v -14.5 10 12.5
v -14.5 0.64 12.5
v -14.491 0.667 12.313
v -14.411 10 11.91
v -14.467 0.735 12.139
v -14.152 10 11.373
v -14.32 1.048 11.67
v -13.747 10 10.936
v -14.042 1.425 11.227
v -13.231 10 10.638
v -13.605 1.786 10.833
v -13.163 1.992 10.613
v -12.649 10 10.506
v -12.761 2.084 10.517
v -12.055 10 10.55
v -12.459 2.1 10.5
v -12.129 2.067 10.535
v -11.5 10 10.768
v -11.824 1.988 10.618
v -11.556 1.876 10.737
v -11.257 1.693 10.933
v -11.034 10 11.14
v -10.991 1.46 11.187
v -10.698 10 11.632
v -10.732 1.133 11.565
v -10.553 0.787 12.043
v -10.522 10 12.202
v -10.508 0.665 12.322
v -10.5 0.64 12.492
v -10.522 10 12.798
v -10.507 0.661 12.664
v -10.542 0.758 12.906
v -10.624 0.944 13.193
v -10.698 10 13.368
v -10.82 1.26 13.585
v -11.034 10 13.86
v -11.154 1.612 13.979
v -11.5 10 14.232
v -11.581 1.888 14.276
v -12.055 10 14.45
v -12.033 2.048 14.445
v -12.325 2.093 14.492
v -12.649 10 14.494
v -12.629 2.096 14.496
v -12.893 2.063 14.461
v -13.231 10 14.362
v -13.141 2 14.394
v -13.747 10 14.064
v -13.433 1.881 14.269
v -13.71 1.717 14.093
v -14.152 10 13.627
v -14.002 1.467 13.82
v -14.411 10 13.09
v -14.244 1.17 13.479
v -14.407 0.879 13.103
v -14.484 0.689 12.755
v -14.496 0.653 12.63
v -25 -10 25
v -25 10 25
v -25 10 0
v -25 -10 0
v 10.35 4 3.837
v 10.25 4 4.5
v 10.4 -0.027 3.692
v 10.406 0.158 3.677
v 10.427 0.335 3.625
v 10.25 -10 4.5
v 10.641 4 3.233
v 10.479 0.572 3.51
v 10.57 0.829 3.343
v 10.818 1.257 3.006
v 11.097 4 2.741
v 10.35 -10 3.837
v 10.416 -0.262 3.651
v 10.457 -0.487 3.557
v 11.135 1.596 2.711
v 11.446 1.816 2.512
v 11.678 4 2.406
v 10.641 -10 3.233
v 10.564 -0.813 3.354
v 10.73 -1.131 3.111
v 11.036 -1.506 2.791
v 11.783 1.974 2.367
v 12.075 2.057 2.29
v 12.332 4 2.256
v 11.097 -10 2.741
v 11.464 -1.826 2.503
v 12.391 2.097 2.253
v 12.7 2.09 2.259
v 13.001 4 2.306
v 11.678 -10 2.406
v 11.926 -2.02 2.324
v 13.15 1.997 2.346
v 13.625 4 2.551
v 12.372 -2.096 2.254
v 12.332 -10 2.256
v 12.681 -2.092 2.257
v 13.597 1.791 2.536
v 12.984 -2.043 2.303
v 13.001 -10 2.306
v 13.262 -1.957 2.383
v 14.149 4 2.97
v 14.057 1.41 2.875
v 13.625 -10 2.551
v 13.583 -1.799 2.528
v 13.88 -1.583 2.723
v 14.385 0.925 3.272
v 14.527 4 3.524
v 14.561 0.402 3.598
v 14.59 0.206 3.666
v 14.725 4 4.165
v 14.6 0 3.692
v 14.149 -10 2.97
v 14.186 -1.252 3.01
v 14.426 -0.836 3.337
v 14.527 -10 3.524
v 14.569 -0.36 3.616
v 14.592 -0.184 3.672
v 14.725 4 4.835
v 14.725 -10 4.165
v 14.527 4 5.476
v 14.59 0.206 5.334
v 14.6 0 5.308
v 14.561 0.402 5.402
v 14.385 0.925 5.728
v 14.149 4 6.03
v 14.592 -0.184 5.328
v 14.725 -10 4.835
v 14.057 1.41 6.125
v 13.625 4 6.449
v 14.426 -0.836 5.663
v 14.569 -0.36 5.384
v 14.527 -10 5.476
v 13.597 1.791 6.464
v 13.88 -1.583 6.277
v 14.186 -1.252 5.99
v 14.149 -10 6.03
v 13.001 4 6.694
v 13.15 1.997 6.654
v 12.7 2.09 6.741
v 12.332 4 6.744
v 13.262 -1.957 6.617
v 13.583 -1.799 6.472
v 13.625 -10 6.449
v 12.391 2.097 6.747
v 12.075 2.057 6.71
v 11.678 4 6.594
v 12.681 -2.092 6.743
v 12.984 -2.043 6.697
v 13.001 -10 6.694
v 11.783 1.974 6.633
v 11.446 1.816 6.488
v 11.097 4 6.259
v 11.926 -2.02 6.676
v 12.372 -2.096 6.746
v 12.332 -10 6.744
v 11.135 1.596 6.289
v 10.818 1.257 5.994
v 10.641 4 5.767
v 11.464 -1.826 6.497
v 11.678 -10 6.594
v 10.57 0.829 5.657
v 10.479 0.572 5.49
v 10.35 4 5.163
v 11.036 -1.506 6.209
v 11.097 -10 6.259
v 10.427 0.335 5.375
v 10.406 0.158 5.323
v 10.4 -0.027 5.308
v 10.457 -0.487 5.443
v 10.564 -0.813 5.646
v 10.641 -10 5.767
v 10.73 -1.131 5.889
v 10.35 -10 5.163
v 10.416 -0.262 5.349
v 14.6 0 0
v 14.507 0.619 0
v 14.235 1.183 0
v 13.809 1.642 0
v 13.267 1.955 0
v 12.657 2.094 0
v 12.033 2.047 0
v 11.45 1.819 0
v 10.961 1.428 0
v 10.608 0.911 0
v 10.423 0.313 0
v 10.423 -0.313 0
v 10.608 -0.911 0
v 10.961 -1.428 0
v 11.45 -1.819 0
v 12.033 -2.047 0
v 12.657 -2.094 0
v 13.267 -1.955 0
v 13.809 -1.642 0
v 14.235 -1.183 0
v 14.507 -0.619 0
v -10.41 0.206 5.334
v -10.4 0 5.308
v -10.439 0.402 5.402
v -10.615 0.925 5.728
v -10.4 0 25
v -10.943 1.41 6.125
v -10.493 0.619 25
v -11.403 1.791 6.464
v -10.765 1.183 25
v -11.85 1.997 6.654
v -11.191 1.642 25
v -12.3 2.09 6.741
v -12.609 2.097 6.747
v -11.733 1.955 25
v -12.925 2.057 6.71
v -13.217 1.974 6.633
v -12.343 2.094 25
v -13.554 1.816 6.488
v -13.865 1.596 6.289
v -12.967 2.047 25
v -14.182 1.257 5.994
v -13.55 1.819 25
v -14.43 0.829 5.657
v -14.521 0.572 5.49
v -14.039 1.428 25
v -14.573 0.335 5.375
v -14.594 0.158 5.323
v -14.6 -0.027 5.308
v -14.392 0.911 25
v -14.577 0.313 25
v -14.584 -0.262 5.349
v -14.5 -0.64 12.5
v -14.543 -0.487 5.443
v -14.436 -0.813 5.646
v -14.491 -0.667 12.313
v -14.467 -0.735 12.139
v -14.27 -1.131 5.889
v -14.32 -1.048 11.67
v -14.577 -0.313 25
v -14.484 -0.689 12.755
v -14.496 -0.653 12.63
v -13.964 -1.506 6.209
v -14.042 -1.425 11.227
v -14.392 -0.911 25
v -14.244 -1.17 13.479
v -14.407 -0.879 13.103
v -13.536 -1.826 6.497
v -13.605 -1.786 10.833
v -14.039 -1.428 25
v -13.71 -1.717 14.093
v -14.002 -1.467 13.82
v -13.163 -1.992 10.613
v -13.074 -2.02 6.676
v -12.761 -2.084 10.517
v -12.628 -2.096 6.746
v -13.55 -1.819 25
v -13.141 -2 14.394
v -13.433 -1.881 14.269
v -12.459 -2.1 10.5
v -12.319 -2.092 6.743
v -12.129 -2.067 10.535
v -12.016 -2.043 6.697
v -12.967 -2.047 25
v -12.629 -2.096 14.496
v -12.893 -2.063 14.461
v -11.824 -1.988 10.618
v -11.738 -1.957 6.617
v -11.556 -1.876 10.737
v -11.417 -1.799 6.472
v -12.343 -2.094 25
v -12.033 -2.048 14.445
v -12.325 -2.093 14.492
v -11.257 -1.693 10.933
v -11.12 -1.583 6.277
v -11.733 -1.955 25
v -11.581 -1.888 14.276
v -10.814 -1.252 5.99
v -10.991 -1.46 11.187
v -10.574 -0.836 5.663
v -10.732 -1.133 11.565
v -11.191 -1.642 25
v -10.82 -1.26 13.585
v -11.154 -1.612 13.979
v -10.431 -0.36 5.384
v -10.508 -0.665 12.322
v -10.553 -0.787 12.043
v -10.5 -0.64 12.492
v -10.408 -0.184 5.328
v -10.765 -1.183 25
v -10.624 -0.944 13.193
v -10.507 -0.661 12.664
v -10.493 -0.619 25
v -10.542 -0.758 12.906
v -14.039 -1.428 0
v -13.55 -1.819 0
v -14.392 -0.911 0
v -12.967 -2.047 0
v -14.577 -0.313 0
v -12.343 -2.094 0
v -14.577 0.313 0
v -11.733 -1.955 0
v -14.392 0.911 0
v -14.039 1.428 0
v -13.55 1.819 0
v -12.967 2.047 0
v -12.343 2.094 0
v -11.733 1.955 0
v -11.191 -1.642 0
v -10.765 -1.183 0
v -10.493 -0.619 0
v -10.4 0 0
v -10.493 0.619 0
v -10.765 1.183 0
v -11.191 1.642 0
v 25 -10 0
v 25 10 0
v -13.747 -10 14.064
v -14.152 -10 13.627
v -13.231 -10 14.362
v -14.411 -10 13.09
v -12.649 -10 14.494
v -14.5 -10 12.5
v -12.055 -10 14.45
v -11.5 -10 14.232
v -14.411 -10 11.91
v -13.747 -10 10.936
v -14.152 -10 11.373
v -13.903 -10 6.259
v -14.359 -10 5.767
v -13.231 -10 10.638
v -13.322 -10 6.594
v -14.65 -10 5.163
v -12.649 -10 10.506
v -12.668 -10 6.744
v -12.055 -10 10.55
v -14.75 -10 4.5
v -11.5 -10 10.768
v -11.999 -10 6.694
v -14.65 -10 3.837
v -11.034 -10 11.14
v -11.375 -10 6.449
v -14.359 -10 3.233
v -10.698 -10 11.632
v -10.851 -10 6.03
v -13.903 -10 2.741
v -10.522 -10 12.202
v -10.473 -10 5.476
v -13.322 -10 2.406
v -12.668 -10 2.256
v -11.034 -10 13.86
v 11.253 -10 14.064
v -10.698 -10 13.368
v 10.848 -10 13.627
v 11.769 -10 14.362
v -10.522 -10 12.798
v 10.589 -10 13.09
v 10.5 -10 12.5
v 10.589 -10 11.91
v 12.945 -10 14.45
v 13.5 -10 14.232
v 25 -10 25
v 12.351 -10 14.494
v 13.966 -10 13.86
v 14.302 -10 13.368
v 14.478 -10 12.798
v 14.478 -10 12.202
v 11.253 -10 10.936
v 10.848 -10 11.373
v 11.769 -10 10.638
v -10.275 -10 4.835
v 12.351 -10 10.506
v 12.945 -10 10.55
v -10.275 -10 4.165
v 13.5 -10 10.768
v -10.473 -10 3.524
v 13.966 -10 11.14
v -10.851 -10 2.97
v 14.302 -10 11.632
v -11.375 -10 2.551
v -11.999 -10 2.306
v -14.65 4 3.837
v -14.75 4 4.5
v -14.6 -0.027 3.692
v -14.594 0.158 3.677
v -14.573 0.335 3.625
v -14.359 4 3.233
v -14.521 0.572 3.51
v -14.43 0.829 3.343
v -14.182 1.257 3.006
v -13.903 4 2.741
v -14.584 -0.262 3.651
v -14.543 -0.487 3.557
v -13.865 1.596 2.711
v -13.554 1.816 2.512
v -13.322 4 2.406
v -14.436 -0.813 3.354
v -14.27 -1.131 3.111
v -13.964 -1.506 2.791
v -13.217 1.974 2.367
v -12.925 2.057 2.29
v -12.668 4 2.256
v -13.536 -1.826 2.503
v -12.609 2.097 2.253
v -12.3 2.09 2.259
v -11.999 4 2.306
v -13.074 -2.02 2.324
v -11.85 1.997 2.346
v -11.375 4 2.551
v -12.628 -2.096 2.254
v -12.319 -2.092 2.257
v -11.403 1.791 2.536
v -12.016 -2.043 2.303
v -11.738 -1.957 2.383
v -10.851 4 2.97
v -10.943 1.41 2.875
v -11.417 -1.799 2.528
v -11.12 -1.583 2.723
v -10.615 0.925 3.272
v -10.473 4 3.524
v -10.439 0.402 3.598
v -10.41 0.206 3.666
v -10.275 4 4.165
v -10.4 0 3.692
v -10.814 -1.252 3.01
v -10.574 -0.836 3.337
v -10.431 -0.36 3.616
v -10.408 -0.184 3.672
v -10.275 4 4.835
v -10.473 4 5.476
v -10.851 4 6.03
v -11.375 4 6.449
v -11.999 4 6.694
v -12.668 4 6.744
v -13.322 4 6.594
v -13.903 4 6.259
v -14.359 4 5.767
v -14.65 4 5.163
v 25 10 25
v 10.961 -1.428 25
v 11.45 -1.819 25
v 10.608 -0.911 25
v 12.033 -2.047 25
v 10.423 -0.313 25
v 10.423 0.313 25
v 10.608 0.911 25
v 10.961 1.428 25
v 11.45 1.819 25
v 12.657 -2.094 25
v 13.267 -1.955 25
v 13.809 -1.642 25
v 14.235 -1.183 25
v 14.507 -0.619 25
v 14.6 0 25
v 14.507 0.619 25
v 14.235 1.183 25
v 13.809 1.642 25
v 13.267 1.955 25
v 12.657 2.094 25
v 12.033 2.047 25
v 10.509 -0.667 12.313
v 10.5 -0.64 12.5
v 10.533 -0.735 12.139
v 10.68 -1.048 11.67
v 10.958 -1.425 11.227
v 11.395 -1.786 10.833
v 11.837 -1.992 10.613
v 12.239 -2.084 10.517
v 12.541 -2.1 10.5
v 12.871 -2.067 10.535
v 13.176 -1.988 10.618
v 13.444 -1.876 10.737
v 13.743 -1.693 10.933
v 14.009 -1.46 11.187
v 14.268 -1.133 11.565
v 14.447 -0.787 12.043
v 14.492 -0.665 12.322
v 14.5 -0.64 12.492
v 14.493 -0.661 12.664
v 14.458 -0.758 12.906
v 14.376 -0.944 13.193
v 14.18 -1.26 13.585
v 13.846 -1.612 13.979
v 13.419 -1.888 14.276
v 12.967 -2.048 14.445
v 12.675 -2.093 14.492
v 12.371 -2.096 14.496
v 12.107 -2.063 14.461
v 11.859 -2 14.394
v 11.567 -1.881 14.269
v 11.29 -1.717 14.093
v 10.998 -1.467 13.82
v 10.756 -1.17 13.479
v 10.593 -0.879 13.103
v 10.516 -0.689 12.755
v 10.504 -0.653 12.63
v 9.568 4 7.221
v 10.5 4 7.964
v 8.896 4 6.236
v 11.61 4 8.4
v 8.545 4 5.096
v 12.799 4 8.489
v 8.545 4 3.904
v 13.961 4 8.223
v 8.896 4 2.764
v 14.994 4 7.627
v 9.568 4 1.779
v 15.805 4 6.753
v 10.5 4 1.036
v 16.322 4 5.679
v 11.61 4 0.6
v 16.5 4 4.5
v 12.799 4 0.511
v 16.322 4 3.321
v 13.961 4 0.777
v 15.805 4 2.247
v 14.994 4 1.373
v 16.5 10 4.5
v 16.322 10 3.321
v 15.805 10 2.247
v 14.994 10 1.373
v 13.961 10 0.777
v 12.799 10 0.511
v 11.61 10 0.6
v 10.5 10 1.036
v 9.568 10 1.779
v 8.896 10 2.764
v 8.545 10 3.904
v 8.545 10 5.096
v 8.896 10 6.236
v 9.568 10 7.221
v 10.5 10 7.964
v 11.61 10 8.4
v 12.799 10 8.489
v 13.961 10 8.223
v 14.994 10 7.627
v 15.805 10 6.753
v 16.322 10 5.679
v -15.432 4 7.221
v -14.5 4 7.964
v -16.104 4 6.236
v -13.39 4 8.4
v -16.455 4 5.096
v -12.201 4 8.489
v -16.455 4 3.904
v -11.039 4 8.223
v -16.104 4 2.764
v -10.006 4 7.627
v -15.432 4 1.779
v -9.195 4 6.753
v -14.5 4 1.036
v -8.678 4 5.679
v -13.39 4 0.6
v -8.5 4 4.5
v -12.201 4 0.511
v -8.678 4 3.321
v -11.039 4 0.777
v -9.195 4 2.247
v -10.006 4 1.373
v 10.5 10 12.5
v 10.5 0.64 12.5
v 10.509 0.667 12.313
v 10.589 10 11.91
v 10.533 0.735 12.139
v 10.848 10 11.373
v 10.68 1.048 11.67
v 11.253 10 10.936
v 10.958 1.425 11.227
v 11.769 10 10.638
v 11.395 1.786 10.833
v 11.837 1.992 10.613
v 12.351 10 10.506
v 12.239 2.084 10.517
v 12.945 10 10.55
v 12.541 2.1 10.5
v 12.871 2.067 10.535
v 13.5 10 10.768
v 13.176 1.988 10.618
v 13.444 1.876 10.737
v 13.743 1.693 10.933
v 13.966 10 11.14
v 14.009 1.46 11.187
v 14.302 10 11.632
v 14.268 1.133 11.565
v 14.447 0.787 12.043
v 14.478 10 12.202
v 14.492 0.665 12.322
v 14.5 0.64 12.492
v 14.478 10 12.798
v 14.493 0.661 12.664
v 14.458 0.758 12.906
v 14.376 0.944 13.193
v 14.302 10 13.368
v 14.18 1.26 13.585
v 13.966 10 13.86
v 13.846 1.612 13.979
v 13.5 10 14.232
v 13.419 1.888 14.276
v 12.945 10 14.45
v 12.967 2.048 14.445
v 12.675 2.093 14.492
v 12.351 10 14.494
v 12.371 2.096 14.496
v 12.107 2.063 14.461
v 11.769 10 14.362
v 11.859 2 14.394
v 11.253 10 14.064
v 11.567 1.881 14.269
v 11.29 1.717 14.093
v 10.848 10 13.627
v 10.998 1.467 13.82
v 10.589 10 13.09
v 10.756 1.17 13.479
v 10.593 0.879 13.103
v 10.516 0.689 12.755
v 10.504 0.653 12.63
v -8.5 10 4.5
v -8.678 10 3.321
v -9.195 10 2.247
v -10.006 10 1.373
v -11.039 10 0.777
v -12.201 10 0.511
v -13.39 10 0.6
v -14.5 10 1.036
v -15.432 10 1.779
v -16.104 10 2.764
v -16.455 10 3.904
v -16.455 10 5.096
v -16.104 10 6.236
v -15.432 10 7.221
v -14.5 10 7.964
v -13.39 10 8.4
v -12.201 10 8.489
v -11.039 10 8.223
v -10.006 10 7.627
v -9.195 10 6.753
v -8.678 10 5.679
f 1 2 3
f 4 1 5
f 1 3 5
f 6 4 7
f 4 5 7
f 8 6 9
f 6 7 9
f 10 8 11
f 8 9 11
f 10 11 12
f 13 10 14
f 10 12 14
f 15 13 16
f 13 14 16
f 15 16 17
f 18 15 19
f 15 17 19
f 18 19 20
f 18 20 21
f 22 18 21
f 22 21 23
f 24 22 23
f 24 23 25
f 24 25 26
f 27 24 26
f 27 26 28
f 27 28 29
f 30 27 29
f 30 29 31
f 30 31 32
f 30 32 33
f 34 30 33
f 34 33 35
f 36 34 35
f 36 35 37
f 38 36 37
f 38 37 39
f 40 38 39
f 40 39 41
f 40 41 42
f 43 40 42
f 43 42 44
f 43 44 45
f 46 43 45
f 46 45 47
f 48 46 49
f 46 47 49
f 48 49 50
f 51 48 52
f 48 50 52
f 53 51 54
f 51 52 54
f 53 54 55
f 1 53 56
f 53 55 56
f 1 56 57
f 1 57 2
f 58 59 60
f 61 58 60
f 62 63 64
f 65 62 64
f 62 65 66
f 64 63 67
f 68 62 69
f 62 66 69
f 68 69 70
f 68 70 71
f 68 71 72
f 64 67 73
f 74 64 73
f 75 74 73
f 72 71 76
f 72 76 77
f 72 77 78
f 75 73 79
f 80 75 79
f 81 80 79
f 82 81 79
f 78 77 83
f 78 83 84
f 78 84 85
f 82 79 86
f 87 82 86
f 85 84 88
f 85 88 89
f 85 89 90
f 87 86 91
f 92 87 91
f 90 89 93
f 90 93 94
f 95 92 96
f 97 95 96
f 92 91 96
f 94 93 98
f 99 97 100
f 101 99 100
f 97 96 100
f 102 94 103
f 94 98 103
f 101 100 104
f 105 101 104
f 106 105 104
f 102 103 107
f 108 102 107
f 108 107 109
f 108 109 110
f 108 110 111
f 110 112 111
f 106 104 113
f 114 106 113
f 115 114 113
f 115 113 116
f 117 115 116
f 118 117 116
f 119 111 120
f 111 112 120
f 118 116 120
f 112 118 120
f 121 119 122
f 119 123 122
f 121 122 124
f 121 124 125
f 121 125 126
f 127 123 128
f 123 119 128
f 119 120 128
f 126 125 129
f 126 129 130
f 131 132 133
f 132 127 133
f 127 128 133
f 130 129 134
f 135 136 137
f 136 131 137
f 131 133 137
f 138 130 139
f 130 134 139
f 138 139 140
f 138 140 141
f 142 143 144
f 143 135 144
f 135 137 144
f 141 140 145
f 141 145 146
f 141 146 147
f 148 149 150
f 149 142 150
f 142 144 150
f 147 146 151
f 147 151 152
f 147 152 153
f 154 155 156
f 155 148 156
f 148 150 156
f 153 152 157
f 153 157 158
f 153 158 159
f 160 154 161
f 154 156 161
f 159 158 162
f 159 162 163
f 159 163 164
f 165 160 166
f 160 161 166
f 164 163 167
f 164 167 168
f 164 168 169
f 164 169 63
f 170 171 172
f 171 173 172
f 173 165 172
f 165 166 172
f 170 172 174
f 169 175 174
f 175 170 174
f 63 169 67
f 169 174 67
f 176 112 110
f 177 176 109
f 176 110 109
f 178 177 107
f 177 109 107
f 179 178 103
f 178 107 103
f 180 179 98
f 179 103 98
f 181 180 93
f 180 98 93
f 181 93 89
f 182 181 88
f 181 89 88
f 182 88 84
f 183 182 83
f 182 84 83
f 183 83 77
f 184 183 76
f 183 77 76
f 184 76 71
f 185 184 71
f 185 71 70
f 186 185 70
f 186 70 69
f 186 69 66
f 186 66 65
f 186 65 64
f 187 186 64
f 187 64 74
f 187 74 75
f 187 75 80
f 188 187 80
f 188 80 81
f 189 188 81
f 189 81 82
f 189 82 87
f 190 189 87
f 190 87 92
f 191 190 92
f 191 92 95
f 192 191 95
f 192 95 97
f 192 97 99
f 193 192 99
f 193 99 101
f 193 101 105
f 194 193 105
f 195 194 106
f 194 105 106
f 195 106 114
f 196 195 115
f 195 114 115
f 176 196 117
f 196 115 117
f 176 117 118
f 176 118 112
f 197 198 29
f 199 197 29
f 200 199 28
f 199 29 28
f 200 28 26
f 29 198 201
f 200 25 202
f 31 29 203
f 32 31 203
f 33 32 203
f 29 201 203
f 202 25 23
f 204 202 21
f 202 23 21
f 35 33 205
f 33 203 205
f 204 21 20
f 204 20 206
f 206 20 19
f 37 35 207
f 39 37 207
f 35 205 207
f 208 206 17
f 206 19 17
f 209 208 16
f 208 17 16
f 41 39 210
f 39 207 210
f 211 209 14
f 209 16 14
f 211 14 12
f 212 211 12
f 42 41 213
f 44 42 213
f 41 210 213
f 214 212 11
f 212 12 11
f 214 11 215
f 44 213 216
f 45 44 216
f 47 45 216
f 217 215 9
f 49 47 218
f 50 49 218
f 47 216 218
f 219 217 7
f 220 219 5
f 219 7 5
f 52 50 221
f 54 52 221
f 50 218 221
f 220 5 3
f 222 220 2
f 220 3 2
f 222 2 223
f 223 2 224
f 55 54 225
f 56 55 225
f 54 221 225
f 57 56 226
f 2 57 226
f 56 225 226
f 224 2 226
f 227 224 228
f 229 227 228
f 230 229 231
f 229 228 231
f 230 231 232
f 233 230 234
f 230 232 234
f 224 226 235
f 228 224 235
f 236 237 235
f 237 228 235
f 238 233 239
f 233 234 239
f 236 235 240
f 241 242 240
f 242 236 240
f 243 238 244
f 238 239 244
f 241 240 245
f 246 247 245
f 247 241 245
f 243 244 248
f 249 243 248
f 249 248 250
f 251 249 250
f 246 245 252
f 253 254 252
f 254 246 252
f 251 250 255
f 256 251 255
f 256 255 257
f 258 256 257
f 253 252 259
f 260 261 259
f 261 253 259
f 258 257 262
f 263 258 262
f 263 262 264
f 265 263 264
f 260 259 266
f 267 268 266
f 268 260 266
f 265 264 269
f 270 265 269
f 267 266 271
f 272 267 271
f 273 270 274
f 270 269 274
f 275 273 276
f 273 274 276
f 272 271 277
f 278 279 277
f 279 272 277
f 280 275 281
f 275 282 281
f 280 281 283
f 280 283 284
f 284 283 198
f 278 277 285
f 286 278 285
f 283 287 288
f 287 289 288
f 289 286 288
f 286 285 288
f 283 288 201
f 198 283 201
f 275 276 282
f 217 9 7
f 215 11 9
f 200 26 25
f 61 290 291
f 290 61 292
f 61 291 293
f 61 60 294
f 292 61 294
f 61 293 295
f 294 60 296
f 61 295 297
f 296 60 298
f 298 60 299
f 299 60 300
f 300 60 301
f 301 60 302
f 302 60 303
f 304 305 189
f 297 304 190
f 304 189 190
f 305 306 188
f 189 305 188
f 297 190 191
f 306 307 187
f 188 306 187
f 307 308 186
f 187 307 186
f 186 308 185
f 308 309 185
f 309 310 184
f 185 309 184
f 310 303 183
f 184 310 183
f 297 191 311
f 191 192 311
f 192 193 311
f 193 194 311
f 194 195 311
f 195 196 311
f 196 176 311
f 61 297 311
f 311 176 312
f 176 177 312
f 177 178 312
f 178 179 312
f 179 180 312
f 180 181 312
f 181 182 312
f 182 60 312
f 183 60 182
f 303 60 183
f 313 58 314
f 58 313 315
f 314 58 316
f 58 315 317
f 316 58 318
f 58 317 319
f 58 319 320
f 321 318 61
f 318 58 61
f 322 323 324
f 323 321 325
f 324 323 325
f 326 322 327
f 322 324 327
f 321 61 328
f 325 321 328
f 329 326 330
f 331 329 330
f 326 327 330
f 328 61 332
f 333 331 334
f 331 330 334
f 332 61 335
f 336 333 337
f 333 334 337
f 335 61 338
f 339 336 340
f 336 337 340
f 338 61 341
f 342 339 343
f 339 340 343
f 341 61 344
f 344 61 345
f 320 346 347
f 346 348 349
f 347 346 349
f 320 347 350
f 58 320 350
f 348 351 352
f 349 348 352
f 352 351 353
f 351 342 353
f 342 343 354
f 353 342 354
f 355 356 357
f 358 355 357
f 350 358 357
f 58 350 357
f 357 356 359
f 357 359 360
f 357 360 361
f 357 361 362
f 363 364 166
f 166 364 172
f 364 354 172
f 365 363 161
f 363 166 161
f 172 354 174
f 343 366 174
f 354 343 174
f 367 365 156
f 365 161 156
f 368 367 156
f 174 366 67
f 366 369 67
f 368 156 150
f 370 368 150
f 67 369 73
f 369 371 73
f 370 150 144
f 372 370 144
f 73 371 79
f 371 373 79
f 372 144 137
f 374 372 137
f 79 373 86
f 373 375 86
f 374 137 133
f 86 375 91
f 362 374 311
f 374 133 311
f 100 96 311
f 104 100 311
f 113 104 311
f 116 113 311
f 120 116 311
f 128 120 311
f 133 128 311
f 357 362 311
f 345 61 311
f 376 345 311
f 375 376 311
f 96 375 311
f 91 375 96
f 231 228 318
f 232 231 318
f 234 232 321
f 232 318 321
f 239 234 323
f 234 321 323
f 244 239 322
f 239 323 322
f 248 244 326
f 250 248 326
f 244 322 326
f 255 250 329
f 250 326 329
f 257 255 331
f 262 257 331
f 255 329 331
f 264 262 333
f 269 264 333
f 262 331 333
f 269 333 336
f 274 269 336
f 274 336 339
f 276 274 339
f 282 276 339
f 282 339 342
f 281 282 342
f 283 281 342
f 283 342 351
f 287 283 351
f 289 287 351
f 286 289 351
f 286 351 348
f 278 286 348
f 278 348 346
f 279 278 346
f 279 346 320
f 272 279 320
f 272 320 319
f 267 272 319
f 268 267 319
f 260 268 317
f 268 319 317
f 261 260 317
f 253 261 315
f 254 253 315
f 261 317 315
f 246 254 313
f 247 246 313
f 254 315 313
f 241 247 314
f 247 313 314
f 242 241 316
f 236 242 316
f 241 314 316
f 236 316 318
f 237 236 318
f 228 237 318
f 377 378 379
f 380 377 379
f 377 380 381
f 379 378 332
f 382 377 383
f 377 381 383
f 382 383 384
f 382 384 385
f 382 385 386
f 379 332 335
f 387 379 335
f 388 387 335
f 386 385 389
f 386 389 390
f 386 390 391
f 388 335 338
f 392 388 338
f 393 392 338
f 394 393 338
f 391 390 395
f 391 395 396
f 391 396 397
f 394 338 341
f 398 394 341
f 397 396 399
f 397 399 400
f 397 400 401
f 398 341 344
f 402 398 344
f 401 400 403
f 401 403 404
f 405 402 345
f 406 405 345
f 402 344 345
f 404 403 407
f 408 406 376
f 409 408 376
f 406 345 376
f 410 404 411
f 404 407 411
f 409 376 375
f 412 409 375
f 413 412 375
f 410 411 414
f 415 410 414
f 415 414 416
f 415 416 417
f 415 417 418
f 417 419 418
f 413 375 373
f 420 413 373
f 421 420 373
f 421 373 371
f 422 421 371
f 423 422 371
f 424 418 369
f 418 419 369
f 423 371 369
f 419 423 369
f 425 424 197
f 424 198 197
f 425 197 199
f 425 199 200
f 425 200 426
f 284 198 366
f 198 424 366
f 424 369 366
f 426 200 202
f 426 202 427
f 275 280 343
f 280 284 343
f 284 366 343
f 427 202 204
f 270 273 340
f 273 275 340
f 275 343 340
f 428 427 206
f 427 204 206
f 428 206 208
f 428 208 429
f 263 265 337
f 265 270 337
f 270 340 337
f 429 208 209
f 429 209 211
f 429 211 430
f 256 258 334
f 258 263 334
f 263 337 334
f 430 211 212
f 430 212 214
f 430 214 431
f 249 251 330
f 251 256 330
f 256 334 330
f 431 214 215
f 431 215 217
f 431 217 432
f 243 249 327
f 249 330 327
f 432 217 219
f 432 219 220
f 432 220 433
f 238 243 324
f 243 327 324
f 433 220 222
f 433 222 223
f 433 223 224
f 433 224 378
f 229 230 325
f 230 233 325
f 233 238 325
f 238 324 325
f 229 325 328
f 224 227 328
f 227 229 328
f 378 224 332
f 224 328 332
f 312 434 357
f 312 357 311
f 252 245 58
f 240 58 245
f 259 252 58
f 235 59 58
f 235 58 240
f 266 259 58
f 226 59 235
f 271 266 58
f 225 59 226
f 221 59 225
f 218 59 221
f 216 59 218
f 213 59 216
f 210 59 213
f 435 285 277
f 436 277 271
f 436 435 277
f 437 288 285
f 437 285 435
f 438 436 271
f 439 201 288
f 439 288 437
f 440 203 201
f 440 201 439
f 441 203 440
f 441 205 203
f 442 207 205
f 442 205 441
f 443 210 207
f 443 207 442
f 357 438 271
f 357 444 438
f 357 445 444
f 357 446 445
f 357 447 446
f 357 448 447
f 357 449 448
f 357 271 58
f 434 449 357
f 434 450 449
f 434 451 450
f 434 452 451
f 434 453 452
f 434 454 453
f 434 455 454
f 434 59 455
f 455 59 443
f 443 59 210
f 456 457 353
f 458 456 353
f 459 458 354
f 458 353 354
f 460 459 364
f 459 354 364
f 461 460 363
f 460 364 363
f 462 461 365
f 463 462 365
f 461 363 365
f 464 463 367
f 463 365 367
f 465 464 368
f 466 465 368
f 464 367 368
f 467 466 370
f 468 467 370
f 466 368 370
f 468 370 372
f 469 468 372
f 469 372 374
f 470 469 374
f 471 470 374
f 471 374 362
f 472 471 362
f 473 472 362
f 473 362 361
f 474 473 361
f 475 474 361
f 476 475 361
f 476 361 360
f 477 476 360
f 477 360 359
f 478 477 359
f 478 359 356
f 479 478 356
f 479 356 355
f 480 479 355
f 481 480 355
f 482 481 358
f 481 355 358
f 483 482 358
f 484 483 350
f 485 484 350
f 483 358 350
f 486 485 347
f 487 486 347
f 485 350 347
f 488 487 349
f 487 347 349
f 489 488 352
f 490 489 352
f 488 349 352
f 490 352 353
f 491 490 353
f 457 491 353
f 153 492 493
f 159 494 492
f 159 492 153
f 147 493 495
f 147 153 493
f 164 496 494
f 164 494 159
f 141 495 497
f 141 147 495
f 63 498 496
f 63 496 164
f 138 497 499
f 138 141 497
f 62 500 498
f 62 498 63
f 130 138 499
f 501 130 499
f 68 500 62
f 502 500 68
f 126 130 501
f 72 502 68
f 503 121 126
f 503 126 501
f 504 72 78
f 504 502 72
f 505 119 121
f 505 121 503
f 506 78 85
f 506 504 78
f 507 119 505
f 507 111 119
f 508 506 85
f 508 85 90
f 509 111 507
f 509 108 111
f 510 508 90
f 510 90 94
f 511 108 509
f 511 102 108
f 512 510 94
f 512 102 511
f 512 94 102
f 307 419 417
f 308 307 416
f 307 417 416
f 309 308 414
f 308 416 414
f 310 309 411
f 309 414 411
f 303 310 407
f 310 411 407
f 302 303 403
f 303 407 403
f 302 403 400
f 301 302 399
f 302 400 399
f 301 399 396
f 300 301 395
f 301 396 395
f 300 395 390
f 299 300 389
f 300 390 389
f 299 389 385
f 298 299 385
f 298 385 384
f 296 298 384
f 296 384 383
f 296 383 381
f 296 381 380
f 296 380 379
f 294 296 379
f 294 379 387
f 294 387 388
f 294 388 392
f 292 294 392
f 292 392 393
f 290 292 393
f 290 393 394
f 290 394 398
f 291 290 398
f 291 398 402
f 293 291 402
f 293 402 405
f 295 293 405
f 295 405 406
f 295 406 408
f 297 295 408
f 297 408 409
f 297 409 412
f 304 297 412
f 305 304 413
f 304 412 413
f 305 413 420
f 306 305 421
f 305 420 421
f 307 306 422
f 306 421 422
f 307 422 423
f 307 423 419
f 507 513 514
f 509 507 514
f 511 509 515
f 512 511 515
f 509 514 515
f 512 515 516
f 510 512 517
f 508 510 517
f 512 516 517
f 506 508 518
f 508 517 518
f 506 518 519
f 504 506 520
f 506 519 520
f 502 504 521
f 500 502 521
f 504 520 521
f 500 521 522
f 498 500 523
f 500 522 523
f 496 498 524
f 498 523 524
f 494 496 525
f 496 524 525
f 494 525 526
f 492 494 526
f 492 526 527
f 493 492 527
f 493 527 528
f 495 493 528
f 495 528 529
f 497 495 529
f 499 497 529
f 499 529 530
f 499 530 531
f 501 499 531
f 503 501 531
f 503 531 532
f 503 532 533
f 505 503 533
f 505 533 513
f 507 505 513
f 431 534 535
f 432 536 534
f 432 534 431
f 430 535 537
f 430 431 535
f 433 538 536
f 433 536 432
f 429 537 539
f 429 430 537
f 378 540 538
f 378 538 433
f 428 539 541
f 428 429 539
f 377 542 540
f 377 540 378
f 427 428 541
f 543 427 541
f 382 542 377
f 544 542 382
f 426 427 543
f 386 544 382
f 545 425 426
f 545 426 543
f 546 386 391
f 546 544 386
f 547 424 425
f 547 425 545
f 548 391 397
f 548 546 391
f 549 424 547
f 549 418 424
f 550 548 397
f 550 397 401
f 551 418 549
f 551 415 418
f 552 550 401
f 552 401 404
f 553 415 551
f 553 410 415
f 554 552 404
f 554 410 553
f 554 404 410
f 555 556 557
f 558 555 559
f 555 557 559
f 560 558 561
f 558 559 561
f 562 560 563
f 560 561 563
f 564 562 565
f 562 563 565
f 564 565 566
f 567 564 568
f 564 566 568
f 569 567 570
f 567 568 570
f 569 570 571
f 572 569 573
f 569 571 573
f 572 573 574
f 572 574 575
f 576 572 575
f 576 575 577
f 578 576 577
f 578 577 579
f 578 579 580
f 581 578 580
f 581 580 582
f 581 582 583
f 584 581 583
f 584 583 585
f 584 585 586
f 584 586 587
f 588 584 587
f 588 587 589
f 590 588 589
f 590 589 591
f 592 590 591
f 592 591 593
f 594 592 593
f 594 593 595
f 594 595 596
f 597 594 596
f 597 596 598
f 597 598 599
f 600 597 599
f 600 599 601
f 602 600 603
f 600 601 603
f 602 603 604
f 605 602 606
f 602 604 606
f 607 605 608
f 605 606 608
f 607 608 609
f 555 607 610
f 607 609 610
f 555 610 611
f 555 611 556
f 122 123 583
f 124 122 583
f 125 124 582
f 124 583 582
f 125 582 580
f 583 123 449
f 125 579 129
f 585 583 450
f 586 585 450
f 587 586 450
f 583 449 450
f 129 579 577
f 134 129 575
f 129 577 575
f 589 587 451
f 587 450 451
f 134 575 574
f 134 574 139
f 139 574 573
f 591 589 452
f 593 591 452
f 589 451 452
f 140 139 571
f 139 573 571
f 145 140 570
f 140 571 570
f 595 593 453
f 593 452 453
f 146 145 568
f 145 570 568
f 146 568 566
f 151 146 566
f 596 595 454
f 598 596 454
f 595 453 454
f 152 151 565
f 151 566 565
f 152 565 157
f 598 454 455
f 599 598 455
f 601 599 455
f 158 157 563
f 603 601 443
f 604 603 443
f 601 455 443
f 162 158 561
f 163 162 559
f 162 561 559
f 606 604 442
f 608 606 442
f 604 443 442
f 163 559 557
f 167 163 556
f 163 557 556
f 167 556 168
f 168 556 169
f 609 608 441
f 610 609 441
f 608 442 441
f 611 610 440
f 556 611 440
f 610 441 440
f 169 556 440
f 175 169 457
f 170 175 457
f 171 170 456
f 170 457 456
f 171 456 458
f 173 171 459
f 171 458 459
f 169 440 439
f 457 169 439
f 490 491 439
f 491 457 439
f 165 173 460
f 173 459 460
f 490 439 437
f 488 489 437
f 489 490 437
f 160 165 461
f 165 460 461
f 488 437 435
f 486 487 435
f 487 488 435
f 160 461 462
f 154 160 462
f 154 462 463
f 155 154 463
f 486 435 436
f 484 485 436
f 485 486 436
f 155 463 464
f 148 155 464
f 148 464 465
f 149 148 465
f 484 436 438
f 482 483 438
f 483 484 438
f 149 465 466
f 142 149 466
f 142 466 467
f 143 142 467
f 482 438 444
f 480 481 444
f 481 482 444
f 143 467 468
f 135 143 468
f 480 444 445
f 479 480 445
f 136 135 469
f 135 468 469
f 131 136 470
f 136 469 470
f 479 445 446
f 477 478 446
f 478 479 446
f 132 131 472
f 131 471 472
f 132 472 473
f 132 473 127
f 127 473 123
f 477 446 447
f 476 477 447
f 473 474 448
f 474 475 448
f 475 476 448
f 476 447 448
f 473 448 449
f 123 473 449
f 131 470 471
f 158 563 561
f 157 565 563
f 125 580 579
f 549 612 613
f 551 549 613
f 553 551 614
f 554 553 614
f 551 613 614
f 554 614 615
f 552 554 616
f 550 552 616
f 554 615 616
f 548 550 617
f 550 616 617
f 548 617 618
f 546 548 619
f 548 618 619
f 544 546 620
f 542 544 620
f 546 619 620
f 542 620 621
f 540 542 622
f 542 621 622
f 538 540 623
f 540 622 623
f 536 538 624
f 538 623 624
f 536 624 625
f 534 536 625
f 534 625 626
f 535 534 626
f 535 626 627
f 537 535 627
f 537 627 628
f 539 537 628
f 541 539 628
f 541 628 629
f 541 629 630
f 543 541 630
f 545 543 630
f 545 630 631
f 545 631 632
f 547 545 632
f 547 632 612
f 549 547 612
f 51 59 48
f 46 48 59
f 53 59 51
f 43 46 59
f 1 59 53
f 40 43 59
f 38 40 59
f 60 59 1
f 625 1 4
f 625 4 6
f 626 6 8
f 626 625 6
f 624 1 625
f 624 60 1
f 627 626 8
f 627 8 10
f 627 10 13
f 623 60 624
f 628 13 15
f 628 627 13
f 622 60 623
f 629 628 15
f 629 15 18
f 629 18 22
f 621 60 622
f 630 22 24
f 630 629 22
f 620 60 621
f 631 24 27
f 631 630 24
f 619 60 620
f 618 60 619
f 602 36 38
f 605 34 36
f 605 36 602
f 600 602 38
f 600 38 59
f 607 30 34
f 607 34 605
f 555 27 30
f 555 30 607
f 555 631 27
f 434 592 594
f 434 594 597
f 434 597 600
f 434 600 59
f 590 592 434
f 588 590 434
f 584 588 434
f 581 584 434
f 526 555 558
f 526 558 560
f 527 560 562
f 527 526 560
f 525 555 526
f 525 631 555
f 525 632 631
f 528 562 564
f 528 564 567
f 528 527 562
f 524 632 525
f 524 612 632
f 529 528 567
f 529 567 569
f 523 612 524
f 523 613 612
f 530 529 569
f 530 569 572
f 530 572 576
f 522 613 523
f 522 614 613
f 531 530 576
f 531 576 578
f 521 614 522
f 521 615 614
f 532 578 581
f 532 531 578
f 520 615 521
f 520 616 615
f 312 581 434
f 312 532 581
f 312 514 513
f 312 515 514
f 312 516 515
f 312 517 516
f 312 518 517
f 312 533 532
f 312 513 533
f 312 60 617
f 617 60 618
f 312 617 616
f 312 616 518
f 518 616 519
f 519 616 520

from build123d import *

# Parameters (mm, degrees)
SKETCH1_W                                        = 50
SKETCH1_H                                        = 25
BOSS_EXTRUDE1_DEPTH                              = 20
CBORE_FOR_M4_HEX_HEAD_MACHINE_SCREW1_D           = 4.5
CBORE_FOR_M4_HEX_HEAD_MACHINE_SCREW1_CBORE_D     = 8
CBORE_FOR_M4_HEX_HEAD_MACHINE_SCREW1_CBORE_DEPTH = 6
F_4_0_4_DIAMETER_HOLE1_D                         = 4
F_4_0_4_DIAMETER_HOLE1_DEPTH                     = 29.359687576
F_4_2_4_2_DIAMETER_HOLE1_D                       = 4.2
F_4_2_4_2_DIAMETER_HOLE1_DEPTH                   = 44.692225279


with BuildPart() as part:
    # Sketch1 → Boss-Extrude1 (new body)
    with BuildSketch(Plane(origin=(0, 10, 0), x_dir=(1, 0, 0), z_dir=(0, 1, 0))):
        with Locations((0, -12.5)):
            Rectangle(SKETCH1_W, SKETCH1_H)
    extrude(amount=-BOSS_EXTRUDE1_DEPTH)

    # CBORE for M4 Hex Head Machine Screw1 (through all)
    with Locations(Plane(origin=(0, 10, 0), x_dir=(1, 0, 0), z_dir=(0, 1, 0))):
        with Locations((-12.5, -4.5), (12.5, -4.5)):
            CounterBoreHole(CBORE_FOR_M4_HEX_HEAD_MACHINE_SCREW1_D / 2, CBORE_FOR_M4_HEX_HEAD_MACHINE_SCREW1_CBORE_D / 2, CBORE_FOR_M4_HEX_HEAD_MACHINE_SCREW1_CBORE_DEPTH)

    # Ø4.0 (4) Diameter Hole1
    with Locations(Plane(origin=(0, 10, 0), x_dir=(1, 0, 0), z_dir=(0, 1, 0))):
        with Locations((-12.5, -12.5), (12.5, -12.5)):
            Hole(F_4_0_4_DIAMETER_HOLE1_D / 2, depth=F_4_0_4_DIAMETER_HOLE1_DEPTH)

    # Ø4.2 (4.2) Diameter Hole1
    with Locations(Plane(origin=(0, 0, 0), x_dir=(-1, 0, 0), z_dir=(0, 0, -1))):
        with Locations((12.5, 0), (-12.5, 0)):
            Hole(F_4_2_4_2_DIAMETER_HOLE1_D / 2, depth=F_4_2_4_2_DIAMETER_HOLE1_DEPTH)


solid = part.part
